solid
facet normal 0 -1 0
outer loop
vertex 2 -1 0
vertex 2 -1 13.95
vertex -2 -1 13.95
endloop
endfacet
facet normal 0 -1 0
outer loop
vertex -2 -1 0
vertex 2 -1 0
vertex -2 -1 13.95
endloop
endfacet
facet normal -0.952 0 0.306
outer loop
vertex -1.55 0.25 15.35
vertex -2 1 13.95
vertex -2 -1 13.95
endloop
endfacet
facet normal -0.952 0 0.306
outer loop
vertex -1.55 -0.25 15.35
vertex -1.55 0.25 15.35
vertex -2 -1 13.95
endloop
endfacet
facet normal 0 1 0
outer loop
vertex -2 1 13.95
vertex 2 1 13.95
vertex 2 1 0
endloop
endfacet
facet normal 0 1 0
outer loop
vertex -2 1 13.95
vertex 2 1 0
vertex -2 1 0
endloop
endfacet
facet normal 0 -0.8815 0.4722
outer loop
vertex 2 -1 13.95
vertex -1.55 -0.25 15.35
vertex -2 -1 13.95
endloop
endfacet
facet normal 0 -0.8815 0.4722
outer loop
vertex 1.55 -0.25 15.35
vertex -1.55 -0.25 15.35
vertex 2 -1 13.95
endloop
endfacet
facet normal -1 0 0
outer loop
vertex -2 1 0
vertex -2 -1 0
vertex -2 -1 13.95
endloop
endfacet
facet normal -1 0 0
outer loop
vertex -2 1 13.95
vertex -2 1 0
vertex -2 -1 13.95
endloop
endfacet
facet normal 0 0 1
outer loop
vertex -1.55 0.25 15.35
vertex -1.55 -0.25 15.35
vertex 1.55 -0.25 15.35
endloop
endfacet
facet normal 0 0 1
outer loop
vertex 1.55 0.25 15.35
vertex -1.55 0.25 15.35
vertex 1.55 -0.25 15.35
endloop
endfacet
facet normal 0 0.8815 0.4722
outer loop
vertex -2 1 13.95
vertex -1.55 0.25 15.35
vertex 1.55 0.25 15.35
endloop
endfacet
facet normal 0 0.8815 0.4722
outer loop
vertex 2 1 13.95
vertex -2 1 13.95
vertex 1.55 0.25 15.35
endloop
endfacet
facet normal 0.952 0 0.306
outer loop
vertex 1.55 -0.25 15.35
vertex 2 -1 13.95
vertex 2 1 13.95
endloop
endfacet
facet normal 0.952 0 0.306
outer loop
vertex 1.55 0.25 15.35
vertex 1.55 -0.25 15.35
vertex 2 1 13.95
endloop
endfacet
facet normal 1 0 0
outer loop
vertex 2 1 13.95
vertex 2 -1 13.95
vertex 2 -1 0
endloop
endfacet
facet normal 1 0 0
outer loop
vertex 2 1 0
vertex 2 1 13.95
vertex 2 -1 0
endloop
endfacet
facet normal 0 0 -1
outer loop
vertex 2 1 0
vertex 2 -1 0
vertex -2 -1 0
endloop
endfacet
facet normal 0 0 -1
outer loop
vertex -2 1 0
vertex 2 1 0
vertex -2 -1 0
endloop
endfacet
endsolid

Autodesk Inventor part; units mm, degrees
ref_plane "YZ Plane" through (0, 0, 0) normal (1, 0, 0) x (0, 1, 0)
ref_plane "XZ Plane" through (0, 0, 0) normal (0, 1, 0) x (-1, 0, 0)
ref_plane "XY Plane" through (0, 0, 0) normal (0, 0, 1) x (1, 0, 0)
sketch "Sketch1" plane through (0, 0, 0) normal (0, 1, 0) x (-1, 0, 0)
  line L0 (-2, 0) -> (2, 0)
  line L1 (2, 0) -> (2, 15.35)
  line L2 (2, 15.35) -> (-2, 15.35)
  line L3 (-2, 15.35) -> (-2, 0)
  point P0 (0, 0)
  point P1 (0, 0)
  dimension "d0" = 4
  dimension "d1" = 15.35
extrude "Extrusion1" add sketch "Sketch1" along normal mid plane 2
chamfer "Chamfer1" distance 1.4 distance2 0.45 1 edges at (-2, 0, 15.35) measured on face at (-2, 0.3333, 10.2333)
chamfer "Chamfer2" distance 1.4 distance2 0.45 1 edges at (2, 0, 15.35) measured on face at (2, -0.3333, 10.2333)
chamfer "Chamfer3" distance 1.4 distance2 0.75 1 edges at (0, 1, 15.35) measured on face at (0.6667, 1, 9.3)
chamfer "Chamfer4" distance 1.4 distance2 0.75 1 edges at (0, -1, 15.35) measured on face at (0.6667, -1, 9.3)
properties material "Nickel-Copper Alloy 400"
